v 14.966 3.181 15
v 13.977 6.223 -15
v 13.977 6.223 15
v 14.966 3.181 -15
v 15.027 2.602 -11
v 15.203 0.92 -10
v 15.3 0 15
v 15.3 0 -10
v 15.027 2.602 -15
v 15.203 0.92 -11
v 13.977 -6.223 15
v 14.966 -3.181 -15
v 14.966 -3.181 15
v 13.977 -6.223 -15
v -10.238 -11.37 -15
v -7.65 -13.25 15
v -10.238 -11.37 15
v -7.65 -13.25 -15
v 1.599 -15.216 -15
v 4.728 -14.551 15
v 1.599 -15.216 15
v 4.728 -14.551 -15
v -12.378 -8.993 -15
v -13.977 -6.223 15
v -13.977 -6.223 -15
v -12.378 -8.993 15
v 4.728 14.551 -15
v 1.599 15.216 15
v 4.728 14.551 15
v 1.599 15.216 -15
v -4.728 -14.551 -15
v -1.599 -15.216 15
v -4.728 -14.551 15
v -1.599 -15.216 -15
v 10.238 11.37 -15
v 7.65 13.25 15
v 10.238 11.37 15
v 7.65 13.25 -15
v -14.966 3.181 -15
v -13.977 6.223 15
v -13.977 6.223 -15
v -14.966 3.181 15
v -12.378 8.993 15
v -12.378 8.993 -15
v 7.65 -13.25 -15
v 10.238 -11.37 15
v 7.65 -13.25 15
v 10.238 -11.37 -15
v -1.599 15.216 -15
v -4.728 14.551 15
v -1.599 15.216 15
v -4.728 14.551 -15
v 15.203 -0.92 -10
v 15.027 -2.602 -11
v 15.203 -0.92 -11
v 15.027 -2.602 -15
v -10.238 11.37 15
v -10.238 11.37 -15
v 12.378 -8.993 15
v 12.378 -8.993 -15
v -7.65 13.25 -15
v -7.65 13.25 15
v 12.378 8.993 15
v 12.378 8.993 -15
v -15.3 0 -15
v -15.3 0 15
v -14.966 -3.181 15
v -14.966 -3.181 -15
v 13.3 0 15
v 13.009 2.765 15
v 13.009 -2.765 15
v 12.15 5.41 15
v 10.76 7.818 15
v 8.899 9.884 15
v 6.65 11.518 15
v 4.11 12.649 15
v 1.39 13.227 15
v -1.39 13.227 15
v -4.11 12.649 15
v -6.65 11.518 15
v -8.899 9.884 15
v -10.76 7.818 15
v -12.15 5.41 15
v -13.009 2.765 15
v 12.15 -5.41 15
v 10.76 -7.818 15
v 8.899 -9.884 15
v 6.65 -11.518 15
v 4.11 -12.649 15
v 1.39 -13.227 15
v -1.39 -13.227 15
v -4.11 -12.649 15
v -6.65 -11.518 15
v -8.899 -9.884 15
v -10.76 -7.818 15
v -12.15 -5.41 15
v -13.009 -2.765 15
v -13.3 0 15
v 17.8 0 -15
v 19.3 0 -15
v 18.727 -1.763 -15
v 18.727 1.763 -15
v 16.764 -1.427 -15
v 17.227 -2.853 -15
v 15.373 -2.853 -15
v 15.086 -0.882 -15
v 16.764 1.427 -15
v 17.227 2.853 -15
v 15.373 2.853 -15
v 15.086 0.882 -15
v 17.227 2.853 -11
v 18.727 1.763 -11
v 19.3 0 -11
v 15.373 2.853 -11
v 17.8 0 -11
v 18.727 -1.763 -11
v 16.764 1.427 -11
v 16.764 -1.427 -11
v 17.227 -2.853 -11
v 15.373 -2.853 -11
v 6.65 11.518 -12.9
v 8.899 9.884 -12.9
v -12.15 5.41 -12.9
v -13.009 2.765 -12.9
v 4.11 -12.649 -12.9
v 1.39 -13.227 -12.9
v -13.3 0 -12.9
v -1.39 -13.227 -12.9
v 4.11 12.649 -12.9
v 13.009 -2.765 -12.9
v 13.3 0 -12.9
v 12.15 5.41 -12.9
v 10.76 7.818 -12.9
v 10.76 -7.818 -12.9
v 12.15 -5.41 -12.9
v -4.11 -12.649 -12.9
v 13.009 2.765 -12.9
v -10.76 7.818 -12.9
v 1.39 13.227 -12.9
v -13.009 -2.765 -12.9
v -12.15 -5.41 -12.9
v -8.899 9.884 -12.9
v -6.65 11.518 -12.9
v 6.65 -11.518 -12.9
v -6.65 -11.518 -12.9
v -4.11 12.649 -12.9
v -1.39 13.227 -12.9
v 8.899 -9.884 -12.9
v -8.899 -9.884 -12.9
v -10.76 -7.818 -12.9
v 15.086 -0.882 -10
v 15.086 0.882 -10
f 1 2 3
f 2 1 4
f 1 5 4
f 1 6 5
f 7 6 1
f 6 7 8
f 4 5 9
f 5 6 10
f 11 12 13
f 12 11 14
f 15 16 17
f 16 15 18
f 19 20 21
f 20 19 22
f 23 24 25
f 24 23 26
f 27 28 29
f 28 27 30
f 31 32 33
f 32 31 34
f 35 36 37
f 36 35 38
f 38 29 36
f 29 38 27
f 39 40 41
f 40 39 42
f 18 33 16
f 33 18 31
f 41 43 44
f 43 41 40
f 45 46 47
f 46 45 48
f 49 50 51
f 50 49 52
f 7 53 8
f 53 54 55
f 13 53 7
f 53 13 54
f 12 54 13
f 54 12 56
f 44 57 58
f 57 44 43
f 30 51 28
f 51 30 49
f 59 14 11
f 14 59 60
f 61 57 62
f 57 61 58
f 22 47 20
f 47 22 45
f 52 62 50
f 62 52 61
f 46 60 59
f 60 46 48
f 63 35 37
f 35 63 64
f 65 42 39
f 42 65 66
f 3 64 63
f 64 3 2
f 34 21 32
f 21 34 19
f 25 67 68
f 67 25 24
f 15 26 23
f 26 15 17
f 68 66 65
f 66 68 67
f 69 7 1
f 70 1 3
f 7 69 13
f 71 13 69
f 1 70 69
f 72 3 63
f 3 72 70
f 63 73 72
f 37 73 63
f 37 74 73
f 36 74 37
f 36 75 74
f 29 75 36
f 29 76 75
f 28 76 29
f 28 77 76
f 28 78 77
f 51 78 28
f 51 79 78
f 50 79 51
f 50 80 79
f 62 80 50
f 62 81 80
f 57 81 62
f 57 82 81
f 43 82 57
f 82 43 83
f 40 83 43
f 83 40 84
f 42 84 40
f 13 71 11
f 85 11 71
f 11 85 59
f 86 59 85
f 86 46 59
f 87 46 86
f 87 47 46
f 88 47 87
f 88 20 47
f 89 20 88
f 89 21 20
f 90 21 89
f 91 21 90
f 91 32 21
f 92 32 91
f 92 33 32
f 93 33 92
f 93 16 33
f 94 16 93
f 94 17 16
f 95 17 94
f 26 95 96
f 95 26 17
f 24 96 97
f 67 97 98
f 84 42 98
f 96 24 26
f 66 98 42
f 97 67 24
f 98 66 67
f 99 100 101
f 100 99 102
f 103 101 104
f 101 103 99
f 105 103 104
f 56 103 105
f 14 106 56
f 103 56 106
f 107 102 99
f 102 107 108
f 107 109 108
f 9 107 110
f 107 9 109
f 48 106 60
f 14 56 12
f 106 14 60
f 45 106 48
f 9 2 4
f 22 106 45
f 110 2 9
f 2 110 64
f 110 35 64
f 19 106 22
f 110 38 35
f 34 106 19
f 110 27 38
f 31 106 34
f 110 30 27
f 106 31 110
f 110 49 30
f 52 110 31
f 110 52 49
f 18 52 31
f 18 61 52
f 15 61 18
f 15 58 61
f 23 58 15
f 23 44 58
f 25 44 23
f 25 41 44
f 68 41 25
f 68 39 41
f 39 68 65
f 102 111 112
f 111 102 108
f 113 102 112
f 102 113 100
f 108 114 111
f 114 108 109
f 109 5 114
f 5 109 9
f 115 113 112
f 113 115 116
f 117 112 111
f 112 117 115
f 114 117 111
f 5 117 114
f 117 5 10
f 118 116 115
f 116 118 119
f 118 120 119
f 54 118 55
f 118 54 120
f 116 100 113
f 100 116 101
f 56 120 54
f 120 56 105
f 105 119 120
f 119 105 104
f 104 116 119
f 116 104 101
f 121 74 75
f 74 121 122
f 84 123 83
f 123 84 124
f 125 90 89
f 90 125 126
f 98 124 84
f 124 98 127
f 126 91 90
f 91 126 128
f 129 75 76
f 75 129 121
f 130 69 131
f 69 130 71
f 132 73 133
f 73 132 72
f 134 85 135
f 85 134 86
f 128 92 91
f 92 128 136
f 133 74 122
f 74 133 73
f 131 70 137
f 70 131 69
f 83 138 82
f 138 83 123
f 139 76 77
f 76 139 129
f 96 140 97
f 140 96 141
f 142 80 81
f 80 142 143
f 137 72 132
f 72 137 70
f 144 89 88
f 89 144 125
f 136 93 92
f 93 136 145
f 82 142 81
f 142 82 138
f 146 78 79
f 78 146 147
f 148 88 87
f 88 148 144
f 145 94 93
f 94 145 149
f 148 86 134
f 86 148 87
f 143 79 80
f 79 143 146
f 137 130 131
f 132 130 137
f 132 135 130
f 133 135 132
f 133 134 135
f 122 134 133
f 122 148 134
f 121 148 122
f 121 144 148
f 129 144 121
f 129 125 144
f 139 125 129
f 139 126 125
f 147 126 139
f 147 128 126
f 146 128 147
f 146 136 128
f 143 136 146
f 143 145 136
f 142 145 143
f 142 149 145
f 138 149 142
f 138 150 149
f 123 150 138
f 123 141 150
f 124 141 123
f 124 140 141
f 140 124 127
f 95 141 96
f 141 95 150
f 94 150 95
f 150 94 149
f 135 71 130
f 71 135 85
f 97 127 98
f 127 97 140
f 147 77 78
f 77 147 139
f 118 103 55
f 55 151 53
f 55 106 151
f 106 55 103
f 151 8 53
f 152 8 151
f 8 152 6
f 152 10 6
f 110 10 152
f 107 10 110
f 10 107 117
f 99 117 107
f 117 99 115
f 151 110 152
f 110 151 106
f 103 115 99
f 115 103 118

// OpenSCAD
//Line Marking paint can retaining clip

length=30;
thickness=2;
insideDiameter=26.6;


module cover(length,insideDiameter,thickness) {
    difference() {
        union(){
   cylinder(h=thickness, d=insideDiameter+2*thickness,center=true);
        cylinder(h=length, d=insideDiameter+2*thickness,center=true);
                translate([(insideDiameter+3*thickness)/2,0,-length/2]) cylinder(h=4, d=6 );
              
        }
   union() {
               translate([0,0,thickness+0.1]) cylinder(h=length, d=insideDiameter,center=true);
                   translate([(insideDiameter+3*thickness)/2,0,-length/2-0.1]) cylinder(h=5.1, d=3 );
   }
}
}

cover(length,insideDiameter,thickness);
